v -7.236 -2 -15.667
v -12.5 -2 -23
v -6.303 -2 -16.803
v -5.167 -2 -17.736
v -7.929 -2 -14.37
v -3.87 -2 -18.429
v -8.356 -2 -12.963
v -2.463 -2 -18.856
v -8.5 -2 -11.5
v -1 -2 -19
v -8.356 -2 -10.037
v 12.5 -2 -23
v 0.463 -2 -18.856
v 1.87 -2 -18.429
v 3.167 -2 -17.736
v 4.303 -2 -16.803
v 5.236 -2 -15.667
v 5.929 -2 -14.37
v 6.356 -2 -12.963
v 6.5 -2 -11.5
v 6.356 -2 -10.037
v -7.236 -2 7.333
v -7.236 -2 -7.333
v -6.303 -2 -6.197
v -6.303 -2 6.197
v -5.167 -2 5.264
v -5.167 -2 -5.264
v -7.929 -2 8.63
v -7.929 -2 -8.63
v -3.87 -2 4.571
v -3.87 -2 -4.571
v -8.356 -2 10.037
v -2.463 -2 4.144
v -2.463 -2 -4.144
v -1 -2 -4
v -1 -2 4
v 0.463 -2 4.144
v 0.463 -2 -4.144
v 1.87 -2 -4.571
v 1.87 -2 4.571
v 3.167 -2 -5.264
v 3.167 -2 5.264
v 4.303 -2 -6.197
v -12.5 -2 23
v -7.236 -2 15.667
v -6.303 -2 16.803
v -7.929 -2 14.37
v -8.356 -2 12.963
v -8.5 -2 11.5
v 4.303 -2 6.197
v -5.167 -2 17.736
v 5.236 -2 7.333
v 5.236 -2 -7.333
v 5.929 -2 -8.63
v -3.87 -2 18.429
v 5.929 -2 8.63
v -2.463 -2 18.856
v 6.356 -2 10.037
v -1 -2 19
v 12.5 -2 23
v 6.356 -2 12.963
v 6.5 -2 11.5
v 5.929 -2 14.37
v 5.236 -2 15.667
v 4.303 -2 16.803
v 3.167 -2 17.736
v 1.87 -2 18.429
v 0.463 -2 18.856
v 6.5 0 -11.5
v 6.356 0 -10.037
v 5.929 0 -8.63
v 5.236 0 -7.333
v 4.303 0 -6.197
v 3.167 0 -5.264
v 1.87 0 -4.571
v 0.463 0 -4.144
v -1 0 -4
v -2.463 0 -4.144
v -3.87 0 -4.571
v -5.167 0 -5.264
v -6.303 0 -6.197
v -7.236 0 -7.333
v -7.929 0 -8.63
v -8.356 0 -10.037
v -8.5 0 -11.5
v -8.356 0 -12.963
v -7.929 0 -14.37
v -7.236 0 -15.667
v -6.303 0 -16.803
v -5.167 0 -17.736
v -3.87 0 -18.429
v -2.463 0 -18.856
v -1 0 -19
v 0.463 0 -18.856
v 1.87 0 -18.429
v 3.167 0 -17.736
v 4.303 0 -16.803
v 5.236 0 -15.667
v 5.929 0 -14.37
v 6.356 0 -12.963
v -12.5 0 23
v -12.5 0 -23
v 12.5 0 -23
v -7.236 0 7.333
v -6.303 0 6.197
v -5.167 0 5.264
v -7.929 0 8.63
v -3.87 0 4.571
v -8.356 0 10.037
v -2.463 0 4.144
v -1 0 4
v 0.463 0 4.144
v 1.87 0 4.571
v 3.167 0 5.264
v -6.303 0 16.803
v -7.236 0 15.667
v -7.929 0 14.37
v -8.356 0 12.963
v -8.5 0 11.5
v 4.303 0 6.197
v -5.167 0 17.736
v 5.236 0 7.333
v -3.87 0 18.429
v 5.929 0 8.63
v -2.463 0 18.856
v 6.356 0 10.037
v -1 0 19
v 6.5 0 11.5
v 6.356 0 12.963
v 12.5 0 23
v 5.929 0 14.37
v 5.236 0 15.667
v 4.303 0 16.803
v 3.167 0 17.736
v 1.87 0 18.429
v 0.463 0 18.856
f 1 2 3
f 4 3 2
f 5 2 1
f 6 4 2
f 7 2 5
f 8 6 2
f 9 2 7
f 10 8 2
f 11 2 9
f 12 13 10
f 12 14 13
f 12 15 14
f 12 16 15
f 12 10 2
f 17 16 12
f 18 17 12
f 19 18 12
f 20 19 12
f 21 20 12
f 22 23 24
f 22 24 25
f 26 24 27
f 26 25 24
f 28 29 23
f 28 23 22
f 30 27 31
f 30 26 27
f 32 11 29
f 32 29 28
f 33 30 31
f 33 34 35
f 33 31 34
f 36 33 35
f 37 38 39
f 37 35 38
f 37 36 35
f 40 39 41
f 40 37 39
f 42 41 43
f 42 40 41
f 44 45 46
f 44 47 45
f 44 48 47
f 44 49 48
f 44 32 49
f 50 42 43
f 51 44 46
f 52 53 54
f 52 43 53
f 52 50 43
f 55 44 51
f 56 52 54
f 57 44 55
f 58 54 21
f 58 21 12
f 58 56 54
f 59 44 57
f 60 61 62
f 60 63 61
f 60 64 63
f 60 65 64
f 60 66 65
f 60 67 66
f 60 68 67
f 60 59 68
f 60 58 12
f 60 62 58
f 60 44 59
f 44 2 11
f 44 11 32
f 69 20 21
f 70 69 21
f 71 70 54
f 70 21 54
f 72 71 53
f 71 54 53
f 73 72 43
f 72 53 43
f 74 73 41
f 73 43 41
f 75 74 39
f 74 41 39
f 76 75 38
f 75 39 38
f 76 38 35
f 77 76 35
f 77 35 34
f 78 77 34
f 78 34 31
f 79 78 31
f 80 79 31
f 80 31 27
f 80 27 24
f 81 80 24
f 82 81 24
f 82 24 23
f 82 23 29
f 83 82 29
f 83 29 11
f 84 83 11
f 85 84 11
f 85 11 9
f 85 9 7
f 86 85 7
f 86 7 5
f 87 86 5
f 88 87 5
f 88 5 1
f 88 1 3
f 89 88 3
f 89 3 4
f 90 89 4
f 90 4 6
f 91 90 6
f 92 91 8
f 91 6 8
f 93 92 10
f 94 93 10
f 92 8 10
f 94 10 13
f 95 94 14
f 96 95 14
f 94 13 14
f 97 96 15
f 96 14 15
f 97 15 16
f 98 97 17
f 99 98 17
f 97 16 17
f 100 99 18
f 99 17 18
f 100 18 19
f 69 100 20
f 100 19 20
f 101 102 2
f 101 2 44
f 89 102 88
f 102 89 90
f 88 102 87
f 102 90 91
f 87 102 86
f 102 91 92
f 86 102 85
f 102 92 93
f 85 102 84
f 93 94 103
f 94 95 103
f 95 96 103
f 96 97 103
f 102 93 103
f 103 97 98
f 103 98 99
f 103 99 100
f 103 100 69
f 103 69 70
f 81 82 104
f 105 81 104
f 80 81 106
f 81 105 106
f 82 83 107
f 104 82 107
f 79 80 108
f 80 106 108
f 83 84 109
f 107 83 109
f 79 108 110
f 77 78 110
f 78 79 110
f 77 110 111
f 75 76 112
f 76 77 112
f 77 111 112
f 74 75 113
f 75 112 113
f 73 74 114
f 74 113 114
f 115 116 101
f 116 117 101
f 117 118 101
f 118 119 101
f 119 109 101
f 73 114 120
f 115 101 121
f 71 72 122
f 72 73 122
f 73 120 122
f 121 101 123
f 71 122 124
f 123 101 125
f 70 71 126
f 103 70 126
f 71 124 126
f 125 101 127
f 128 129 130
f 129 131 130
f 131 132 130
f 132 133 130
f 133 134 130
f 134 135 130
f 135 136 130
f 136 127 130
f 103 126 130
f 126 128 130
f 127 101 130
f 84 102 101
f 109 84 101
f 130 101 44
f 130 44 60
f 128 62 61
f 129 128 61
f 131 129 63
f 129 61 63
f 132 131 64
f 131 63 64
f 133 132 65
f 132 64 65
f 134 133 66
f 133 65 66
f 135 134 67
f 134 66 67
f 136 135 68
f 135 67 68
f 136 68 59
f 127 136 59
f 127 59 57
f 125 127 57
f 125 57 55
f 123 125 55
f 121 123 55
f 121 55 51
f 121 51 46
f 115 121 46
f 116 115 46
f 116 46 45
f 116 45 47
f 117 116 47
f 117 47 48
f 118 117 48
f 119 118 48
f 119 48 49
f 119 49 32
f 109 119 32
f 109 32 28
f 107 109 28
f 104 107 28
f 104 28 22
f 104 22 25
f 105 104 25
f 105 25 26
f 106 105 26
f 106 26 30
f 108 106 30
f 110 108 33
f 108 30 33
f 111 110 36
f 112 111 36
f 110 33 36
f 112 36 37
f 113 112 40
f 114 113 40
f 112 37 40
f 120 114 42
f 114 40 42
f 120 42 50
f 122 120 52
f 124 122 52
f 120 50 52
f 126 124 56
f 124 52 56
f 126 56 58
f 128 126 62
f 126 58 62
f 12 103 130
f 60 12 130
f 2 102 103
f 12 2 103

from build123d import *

# Parameters (mm, degrees)
SKETCH_W     = 25
SKETCH_H     = 46
PAD_DEPTH    = 2
SKETCH001_R  = 7.5
POCKET_DEPTH = 5


with BuildPart() as part:
    # Sketch → Pad (new body)
    with BuildSketch(Plane.XZ):
        Rectangle(SKETCH_W, SKETCH_H)
    extrude(amount=PAD_DEPTH)

    # Sketch001 (on Face6 of Pad) → Pocket (cut)
    with BuildSketch(Plane.XZ.offset(2)):
        with Locations((-1, 11.5)):
            Circle(SKETCH001_R)
        with Locations((-1, -11.5)):
            Circle(SKETCH001_R)
    extrude(amount=-POCKET_DEPTH, mode=Mode.SUBTRACT)


solid = part.part
